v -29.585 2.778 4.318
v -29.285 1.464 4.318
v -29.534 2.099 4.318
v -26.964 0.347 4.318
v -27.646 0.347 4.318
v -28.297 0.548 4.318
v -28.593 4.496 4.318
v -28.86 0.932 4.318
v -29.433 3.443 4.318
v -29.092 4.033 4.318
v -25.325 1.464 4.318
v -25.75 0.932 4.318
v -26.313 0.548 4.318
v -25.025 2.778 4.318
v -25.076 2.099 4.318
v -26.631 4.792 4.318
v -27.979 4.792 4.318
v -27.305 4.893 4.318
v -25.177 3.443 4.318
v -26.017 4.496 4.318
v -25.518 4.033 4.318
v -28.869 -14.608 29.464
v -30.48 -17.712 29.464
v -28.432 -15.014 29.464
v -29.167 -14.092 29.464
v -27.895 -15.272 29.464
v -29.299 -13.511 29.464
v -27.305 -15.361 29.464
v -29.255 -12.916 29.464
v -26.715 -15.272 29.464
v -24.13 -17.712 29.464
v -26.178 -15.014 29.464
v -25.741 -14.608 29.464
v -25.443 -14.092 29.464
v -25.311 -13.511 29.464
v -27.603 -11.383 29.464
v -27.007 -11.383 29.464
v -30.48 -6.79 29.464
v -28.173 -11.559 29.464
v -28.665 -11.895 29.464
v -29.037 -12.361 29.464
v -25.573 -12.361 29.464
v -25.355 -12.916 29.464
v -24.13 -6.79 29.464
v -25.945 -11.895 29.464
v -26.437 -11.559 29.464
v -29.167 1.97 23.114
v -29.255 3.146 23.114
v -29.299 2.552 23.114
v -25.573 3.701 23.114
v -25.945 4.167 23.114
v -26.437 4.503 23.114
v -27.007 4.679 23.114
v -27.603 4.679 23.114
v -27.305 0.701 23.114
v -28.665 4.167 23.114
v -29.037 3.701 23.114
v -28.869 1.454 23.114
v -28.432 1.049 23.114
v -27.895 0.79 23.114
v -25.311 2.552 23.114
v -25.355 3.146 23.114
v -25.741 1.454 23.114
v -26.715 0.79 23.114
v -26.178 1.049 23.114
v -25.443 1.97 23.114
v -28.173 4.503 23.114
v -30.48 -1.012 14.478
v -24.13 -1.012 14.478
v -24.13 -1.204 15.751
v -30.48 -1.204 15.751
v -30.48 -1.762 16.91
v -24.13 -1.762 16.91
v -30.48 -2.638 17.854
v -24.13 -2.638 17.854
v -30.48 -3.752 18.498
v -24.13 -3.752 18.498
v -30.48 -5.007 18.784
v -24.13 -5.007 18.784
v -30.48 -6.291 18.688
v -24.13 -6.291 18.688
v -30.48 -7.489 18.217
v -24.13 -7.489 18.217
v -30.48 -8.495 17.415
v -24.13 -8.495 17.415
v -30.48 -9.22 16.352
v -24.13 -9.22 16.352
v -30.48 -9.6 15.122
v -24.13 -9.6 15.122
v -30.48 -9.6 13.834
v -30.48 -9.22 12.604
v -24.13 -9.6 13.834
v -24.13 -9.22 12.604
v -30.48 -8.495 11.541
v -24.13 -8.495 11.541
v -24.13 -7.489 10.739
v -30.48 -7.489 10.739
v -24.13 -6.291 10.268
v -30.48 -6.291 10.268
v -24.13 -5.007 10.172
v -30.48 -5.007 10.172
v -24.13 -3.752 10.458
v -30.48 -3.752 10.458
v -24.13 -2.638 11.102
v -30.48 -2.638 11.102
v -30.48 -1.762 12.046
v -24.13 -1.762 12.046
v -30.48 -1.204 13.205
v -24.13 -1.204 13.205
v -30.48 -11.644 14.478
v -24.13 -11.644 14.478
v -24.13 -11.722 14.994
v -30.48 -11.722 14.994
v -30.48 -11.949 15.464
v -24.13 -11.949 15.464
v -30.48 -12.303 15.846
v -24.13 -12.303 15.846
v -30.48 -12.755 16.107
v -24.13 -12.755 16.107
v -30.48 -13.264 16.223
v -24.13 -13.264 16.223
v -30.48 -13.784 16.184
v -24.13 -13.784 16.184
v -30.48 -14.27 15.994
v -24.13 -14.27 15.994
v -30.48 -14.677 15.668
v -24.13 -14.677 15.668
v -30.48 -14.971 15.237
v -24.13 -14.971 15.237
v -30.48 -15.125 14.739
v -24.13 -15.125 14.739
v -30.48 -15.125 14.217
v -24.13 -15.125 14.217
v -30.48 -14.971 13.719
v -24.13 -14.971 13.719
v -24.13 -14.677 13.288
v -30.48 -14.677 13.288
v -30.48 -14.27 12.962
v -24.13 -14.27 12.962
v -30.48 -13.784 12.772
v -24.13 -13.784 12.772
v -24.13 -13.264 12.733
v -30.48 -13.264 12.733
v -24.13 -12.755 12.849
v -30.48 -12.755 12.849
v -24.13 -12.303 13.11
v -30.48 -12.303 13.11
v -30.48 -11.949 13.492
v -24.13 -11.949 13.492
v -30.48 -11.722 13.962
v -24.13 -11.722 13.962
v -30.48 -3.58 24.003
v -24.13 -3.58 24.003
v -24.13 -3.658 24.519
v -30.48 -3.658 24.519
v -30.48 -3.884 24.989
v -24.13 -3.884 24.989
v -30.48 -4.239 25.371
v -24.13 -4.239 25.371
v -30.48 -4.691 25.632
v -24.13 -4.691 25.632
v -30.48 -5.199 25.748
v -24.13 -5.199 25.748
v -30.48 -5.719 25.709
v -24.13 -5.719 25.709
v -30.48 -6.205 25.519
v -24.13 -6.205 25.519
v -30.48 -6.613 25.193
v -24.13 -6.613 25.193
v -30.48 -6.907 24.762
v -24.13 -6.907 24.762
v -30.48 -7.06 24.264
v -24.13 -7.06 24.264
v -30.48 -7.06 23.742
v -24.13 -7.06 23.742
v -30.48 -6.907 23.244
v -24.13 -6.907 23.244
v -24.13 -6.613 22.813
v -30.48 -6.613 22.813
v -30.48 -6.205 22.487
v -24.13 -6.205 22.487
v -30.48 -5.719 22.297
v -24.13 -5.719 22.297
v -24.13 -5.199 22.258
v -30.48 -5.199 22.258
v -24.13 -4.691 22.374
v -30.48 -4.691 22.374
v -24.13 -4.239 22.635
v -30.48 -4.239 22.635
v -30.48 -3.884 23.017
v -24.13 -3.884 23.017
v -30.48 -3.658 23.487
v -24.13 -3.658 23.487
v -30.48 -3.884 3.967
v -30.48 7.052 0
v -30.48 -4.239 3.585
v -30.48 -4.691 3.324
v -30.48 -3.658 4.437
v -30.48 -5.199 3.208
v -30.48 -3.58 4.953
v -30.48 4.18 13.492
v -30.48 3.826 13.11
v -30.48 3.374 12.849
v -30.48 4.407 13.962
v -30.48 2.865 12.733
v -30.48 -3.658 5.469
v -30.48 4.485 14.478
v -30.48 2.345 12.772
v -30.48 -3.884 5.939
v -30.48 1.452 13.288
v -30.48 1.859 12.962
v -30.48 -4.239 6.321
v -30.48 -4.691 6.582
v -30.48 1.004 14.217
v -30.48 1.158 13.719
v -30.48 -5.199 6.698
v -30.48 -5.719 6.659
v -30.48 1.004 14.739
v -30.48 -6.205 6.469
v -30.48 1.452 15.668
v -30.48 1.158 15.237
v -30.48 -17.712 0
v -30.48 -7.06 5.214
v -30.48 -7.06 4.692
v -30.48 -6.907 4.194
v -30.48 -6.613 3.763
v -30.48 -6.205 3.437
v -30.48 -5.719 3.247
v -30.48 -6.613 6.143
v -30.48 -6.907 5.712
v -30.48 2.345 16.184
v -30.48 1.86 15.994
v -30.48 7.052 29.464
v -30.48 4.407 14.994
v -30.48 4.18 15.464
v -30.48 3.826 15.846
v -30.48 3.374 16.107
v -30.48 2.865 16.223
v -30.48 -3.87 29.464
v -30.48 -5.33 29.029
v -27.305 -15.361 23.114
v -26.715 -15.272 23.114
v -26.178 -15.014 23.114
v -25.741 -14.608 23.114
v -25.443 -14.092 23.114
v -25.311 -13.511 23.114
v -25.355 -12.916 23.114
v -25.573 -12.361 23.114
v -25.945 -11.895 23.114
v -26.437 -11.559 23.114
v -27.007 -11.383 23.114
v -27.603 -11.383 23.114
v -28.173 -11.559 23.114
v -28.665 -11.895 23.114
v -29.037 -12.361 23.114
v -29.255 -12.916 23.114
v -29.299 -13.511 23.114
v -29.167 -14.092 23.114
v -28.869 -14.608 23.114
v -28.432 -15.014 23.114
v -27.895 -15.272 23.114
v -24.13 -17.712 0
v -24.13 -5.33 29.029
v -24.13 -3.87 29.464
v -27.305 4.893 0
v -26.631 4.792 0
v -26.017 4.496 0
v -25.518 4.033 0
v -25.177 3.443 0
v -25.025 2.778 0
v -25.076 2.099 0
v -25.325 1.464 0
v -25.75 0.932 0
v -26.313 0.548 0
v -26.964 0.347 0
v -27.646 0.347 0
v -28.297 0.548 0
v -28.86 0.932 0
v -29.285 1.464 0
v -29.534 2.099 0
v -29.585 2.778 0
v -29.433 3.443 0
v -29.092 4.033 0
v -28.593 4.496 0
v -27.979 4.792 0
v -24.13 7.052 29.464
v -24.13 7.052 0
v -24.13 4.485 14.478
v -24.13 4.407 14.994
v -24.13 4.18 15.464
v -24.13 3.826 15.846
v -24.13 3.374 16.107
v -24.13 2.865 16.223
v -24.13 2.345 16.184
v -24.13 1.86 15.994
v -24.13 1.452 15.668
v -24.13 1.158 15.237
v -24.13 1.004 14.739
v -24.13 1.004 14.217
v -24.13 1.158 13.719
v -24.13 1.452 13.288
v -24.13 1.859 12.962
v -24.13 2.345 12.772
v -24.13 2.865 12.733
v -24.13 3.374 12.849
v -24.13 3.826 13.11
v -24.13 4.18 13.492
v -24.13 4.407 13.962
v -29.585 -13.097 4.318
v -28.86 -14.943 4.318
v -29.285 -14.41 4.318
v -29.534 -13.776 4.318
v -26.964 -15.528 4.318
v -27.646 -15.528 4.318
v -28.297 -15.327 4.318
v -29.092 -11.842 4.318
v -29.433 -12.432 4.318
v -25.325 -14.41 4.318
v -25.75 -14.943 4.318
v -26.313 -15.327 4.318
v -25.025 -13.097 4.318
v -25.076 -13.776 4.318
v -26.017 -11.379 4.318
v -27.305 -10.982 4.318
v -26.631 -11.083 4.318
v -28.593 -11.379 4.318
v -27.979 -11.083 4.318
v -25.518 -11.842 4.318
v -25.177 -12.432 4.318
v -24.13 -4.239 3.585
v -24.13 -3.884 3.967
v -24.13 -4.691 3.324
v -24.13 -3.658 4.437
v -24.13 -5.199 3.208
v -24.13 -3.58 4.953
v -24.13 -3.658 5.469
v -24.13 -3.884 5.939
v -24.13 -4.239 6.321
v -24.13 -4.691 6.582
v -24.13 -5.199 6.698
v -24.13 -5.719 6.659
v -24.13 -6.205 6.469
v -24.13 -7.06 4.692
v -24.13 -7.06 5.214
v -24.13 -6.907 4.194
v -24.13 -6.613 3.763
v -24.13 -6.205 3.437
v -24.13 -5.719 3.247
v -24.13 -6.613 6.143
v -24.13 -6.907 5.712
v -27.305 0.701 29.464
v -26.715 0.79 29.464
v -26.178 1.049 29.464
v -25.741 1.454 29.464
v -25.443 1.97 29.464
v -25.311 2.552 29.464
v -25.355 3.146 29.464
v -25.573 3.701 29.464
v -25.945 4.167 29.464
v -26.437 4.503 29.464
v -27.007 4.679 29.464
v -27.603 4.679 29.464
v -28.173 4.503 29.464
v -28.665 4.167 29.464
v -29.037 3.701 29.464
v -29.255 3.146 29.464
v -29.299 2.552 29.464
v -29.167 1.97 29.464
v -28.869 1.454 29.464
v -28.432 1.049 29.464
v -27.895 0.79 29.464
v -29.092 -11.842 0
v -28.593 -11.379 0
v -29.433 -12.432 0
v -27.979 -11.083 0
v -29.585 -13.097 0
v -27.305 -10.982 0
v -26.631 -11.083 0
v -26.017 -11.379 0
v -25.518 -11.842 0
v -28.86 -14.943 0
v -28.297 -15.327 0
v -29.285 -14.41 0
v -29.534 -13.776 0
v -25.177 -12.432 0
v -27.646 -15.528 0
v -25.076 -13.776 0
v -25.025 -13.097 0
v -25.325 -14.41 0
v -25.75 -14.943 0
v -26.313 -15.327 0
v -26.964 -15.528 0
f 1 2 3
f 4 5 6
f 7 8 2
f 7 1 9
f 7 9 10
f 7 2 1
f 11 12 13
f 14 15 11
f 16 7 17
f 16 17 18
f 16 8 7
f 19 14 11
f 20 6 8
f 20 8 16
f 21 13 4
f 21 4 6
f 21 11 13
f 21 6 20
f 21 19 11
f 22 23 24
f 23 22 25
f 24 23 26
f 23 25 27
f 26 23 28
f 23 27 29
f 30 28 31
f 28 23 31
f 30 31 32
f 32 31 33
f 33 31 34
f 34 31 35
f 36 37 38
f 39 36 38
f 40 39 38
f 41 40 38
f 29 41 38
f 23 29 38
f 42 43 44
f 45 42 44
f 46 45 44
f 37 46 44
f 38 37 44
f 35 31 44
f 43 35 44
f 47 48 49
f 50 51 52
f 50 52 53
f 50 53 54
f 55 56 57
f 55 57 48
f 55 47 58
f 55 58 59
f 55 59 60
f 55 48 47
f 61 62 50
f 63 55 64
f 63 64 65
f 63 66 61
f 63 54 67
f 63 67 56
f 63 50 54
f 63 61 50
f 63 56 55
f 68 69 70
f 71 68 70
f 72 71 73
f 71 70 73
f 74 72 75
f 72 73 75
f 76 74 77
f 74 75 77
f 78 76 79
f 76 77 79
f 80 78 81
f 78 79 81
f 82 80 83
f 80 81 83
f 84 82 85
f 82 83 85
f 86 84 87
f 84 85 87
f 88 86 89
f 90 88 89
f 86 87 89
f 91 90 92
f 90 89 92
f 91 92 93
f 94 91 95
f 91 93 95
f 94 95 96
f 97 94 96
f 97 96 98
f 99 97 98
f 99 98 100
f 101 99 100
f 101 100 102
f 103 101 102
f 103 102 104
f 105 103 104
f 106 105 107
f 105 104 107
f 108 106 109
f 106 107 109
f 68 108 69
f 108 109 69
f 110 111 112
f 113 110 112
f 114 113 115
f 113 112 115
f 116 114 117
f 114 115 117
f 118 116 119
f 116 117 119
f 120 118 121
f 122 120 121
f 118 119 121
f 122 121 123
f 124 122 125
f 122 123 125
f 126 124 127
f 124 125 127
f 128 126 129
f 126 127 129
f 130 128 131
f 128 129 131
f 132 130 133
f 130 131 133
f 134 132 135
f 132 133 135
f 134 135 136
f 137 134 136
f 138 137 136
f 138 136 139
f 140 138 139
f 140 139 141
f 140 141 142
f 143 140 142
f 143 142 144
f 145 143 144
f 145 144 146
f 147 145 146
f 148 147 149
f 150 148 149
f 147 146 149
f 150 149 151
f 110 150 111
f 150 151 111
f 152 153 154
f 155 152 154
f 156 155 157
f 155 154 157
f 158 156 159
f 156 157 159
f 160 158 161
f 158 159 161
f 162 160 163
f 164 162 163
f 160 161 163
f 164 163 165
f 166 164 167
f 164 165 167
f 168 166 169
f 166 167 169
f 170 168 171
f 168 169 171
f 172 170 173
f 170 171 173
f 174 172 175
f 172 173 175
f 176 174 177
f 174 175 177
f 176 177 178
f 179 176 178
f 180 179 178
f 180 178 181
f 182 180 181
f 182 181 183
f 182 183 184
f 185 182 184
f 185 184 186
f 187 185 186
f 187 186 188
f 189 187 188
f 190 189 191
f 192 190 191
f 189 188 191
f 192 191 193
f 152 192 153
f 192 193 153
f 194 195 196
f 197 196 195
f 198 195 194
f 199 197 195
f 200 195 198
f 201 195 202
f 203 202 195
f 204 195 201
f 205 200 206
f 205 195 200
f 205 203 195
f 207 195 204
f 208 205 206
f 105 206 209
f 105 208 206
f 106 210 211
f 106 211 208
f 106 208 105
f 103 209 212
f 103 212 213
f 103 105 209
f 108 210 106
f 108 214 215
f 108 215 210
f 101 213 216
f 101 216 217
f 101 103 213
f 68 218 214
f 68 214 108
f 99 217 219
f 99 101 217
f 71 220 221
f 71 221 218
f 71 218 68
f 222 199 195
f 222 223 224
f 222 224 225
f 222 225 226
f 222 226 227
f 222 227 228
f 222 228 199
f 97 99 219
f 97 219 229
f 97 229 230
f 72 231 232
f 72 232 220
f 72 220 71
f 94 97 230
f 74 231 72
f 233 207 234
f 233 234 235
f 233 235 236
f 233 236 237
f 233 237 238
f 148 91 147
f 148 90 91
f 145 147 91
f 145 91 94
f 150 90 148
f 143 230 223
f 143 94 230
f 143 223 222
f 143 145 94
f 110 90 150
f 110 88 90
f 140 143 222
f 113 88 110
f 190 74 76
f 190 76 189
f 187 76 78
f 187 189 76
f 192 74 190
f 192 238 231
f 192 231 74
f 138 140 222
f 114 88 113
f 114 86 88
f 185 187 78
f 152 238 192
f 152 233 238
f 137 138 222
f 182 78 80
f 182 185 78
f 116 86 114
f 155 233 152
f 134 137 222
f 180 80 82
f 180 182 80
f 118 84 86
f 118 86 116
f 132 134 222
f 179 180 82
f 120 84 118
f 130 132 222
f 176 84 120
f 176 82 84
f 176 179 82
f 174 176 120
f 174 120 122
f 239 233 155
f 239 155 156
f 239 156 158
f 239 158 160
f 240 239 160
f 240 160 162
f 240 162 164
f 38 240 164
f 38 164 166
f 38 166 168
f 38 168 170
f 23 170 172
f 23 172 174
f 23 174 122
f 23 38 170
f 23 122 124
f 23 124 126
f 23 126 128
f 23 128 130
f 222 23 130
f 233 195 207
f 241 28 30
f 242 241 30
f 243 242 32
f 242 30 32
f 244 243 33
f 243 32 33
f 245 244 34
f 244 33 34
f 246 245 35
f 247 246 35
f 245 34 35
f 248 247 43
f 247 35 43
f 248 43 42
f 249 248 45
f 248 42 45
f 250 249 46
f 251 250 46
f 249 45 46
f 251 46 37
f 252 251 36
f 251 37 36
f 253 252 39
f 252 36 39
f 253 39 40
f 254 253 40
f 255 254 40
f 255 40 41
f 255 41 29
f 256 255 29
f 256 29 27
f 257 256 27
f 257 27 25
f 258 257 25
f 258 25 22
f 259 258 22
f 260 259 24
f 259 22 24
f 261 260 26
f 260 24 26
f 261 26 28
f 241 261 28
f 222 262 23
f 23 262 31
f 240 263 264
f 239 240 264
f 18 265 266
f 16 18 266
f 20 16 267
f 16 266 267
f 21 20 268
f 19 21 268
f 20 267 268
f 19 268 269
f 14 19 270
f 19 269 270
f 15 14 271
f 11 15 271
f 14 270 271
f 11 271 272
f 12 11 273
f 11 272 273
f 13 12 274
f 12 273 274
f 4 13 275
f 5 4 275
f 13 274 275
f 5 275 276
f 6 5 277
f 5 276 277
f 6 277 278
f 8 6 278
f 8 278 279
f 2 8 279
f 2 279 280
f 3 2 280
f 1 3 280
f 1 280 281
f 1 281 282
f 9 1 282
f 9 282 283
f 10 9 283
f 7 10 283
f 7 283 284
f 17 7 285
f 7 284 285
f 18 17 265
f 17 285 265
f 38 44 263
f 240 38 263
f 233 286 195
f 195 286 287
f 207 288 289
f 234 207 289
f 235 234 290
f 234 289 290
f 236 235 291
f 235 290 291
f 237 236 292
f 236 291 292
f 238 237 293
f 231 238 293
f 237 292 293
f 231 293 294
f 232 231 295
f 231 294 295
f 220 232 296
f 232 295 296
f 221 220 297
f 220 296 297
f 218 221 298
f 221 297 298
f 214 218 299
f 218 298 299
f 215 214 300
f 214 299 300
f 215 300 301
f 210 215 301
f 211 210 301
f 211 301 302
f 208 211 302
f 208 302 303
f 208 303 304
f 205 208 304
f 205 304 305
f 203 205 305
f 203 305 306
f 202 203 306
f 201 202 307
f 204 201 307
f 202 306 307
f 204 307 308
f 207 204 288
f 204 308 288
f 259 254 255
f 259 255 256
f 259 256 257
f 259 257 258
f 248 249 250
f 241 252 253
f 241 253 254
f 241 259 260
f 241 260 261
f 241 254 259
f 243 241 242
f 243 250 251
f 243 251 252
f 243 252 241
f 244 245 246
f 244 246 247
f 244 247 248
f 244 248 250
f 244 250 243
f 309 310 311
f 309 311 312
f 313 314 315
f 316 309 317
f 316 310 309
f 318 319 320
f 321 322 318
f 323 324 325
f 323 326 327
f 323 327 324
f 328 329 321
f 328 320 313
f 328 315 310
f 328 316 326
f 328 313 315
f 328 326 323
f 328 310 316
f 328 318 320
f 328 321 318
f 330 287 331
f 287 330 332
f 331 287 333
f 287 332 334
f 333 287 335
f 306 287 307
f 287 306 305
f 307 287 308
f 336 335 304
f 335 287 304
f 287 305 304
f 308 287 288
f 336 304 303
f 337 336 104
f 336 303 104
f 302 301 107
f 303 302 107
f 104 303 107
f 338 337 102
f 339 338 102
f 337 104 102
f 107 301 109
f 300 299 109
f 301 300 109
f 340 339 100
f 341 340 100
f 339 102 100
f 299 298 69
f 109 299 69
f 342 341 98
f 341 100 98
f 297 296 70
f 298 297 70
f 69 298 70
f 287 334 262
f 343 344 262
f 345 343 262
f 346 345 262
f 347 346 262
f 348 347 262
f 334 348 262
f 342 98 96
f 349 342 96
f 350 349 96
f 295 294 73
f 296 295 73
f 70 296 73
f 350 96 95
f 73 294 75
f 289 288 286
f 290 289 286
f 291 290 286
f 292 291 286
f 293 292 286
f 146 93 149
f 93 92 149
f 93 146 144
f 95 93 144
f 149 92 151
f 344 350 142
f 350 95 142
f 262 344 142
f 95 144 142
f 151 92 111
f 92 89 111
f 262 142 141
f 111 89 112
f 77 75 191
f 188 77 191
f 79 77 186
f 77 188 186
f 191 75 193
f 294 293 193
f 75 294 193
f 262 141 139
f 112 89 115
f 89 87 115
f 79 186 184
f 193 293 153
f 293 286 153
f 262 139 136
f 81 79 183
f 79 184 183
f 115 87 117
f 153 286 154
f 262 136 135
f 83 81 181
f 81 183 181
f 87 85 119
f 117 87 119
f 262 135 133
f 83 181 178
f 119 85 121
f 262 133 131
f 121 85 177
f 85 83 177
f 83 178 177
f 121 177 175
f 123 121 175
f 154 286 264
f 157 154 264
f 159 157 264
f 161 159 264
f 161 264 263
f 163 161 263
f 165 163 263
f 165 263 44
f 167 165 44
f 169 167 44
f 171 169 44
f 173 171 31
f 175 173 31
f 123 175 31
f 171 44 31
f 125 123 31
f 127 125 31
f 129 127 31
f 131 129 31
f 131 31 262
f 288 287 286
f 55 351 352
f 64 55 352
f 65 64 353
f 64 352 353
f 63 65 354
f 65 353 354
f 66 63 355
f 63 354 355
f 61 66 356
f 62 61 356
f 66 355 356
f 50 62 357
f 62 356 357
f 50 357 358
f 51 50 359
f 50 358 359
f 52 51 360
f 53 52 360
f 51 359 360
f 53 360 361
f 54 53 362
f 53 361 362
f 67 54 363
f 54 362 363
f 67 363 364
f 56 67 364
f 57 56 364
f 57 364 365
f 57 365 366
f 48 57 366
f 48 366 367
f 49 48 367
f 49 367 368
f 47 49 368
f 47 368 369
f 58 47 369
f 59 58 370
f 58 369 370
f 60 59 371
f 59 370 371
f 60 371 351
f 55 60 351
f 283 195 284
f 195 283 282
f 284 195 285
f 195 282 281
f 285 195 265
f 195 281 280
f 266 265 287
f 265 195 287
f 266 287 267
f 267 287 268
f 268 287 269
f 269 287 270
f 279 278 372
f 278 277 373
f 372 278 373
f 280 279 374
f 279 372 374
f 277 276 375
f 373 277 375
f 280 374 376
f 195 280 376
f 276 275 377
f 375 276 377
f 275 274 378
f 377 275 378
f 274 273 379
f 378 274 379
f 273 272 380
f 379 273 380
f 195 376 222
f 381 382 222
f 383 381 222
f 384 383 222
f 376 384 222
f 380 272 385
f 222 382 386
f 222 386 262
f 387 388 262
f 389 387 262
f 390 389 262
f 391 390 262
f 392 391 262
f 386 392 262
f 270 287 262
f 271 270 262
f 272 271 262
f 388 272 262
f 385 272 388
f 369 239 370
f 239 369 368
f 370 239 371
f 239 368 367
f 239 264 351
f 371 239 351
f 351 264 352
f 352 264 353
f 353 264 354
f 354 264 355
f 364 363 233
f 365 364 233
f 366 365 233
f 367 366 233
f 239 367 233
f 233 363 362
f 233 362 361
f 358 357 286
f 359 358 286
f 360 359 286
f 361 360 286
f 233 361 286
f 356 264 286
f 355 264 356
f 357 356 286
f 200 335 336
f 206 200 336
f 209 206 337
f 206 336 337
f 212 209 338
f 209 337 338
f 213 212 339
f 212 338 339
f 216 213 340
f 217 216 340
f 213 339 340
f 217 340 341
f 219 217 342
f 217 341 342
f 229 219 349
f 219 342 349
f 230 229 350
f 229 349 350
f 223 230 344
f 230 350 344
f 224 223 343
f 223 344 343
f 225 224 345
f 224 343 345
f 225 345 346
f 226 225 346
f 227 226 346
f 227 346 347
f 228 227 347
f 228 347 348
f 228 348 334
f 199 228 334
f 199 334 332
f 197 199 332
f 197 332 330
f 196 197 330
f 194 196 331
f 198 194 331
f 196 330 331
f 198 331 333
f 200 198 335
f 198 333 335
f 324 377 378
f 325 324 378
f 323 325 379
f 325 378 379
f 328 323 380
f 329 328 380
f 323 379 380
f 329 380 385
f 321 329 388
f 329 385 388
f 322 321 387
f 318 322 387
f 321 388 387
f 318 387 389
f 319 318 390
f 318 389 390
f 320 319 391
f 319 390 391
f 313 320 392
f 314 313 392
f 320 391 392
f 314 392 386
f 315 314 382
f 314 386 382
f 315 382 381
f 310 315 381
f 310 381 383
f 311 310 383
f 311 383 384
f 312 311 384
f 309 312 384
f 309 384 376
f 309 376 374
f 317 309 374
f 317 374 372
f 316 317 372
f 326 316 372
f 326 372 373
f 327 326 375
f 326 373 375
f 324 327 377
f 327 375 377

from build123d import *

# Parameters (mm, degrees)
SKETCH028_R     = 1.75
SKETCH028_R_2   = 4.318
PAD017_DEPTH    = 6.35
SKETCH036_R     = 2
POCKET014_DEPTH = 6.35
SKETCH050_R     = 2.286
POCKET022_DEPTH = 4.318


with BuildPart() as part:
    # Sketch028 → Pad017 (new body)
    with BuildSketch(Plane.YZ):
        Polygon((12.3825, 0), (-12.3825, 0), (-12.3825, 29.464), (-1.4605, 29.464), (0, 29.0286659329), (1.4605, 29.464), (12.3825, 29.464), align=None)
        with Locations((0, 24.003)):
            Circle(SKETCH028_R, mode=Mode.SUBTRACT)
        with Locations((8.0645, 14.478)):
            Circle(SKETCH028_R, mode=Mode.SUBTRACT)
        with Locations((0, 4.953)):
            Circle(SKETCH028_R, mode=Mode.SUBTRACT)
        with Locations((-8.0645, 14.478)):
            Circle(SKETCH028_R, mode=Mode.SUBTRACT)
        with Locations((0, 14.478)):
            Circle(SKETCH028_R_2, mode=Mode.SUBTRACT)
    extrude(amount=-PAD017_DEPTH)

    # Sketch036 (on Face1 of Pad017) → Pocket014 (cut)
    with BuildSketch(Plane(origin=(0, 0, 29.464), x_dir=(0, -1, 0), z_dir=(0, 0, 1))):
        with Locations((-8.0310998827, -3.175)):
            Circle(SKETCH036_R)
        with Locations((8.0310998827, -3.175)):
            Circle(SKETCH036_R)
    extrude(amount=-POCKET014_DEPTH, mode=Mode.SUBTRACT)

    # Sketch050 (on Face8 of Pocket014) → Pocket022 (cut)
    with BuildSketch(Plane.YX):
        with Locations((-7.9375, -3.175)):
            Circle(SKETCH050_R)
        with Locations((7.9375, -3.175)):
            Circle(SKETCH050_R)
    extrude(amount=-POCKET022_DEPTH, mode=Mode.SUBTRACT)


with BuildPart() as part_1:
    # Body010 placement: moved
    add(part.part.moved(Location((-24.13, -5.33, 0))))


solid = part_1.part
